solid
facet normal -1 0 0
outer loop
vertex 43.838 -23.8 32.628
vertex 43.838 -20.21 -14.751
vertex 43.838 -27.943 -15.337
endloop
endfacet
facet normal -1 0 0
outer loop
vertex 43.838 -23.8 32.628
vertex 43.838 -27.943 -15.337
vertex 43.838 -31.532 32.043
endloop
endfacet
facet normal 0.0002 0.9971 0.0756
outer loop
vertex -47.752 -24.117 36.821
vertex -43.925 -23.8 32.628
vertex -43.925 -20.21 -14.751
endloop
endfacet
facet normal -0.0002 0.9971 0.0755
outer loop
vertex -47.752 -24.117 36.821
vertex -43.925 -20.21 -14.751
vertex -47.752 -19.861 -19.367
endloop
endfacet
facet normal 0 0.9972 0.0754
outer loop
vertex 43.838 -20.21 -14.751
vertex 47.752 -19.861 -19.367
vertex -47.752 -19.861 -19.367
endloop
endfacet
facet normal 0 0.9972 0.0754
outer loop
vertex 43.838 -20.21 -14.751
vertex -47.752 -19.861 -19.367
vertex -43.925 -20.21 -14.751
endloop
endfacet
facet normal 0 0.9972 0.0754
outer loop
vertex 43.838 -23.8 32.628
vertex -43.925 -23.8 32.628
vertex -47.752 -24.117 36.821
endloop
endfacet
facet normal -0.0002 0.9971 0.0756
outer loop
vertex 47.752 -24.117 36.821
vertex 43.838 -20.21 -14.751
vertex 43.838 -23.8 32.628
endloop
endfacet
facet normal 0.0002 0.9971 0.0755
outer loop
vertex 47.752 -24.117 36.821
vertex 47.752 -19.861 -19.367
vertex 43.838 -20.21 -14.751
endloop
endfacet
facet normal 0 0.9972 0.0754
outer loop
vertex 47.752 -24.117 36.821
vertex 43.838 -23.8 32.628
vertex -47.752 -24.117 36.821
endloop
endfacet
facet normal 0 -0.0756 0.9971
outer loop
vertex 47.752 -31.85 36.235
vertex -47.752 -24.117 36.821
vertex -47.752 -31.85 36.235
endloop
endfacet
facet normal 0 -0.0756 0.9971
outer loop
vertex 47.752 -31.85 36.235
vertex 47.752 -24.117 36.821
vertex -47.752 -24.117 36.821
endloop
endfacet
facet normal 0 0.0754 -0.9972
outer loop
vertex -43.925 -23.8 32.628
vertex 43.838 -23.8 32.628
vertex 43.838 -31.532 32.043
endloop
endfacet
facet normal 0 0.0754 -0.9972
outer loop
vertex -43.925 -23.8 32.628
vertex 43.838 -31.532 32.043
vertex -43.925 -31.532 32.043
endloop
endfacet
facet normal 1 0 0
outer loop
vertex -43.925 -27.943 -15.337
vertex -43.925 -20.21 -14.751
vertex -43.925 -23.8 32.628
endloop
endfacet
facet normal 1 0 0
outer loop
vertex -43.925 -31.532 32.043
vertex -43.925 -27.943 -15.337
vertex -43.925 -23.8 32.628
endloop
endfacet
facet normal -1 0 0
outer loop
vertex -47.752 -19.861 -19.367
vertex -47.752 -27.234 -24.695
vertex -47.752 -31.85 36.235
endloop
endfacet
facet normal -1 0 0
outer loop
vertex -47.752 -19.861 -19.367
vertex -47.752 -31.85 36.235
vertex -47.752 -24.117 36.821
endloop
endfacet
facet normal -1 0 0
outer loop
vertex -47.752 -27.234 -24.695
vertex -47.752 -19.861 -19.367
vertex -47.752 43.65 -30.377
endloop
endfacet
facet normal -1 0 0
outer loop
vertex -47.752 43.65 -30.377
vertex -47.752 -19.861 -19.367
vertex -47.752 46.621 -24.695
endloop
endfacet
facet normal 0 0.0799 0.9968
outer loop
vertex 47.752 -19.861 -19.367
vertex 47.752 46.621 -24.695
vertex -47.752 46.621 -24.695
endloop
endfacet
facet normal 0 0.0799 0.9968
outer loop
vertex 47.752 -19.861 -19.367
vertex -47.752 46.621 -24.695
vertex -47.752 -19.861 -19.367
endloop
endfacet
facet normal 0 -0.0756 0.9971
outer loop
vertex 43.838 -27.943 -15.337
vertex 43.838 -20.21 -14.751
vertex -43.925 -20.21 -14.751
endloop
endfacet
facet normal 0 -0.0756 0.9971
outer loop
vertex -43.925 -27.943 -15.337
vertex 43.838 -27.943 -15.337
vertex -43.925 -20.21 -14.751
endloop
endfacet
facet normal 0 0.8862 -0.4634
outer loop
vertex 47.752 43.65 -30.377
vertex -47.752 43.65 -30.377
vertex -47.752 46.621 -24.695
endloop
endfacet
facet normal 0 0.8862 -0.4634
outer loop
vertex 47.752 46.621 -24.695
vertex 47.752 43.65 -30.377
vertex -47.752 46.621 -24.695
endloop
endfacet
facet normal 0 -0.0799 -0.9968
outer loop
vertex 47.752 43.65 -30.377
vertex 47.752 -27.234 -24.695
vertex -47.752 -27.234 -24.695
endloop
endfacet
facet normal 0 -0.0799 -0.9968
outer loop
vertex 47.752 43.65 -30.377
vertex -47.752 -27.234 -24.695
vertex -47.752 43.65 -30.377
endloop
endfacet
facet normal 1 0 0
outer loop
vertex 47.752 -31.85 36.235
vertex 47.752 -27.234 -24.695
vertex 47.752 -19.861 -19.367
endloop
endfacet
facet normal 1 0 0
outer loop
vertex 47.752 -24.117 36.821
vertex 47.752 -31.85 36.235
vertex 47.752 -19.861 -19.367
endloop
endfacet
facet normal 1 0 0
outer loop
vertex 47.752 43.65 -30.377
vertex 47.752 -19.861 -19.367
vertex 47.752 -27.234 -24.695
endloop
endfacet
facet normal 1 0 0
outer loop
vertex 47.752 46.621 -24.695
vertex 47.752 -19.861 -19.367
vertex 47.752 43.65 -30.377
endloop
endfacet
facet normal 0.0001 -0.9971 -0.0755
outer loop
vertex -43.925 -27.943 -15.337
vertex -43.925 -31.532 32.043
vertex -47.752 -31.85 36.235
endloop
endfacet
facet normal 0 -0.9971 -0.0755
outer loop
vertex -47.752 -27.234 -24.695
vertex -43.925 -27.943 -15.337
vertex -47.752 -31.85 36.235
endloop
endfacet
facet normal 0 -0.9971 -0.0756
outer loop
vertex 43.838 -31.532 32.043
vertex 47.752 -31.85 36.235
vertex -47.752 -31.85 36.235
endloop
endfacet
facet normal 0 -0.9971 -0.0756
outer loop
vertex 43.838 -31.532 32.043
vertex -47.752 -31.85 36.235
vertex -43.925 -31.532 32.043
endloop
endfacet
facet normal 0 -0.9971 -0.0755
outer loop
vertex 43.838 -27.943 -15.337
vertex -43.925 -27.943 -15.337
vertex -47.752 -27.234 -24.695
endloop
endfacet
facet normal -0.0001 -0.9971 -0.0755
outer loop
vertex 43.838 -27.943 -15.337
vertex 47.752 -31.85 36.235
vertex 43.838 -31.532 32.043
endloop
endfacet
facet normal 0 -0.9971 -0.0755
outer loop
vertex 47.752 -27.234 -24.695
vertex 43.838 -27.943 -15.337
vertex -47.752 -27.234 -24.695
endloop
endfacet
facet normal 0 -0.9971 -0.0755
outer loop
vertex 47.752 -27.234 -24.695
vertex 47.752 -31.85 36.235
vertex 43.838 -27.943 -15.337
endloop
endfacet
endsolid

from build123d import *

# Parameters (mm, degrees)
F1_DEPTH = 47.752
F2_W     = 87.7630114555
F2_H     = 47.5155450404
F3_DEPTH = 32.004


with BuildPart() as f1:
    # F0 (on Right) → F1 (new body, symmetric)
    with BuildSketch(Plane.YZ):
        Polygon((-31.8501219153, 36.2352915108), (-27.2341612726, -24.6953871101), (43.6497934896, -30.3766369124), (46.6212034225, -24.6953871101), (-19.860636737, -19.3669606344), (-24.1173089374, 36.8211106937), align=None)
    extrude(amount=F1_DEPTH, both=True)

    # F2 (on face) → F3 (cut)
    with BuildSketch(Plane(origin=(0, -21.2061243549, -1.6065246214), x_dir=(-1, 0, 0), z_dir=(0, 0.9971426879, 0.075541115))):
        with Locations((0.0438690186, 10.5752218515)):
            Rectangle(F2_W, F2_H)
    extrude(amount=-F3_DEPTH, mode=Mode.SUBTRACT)


solid = f1.part
